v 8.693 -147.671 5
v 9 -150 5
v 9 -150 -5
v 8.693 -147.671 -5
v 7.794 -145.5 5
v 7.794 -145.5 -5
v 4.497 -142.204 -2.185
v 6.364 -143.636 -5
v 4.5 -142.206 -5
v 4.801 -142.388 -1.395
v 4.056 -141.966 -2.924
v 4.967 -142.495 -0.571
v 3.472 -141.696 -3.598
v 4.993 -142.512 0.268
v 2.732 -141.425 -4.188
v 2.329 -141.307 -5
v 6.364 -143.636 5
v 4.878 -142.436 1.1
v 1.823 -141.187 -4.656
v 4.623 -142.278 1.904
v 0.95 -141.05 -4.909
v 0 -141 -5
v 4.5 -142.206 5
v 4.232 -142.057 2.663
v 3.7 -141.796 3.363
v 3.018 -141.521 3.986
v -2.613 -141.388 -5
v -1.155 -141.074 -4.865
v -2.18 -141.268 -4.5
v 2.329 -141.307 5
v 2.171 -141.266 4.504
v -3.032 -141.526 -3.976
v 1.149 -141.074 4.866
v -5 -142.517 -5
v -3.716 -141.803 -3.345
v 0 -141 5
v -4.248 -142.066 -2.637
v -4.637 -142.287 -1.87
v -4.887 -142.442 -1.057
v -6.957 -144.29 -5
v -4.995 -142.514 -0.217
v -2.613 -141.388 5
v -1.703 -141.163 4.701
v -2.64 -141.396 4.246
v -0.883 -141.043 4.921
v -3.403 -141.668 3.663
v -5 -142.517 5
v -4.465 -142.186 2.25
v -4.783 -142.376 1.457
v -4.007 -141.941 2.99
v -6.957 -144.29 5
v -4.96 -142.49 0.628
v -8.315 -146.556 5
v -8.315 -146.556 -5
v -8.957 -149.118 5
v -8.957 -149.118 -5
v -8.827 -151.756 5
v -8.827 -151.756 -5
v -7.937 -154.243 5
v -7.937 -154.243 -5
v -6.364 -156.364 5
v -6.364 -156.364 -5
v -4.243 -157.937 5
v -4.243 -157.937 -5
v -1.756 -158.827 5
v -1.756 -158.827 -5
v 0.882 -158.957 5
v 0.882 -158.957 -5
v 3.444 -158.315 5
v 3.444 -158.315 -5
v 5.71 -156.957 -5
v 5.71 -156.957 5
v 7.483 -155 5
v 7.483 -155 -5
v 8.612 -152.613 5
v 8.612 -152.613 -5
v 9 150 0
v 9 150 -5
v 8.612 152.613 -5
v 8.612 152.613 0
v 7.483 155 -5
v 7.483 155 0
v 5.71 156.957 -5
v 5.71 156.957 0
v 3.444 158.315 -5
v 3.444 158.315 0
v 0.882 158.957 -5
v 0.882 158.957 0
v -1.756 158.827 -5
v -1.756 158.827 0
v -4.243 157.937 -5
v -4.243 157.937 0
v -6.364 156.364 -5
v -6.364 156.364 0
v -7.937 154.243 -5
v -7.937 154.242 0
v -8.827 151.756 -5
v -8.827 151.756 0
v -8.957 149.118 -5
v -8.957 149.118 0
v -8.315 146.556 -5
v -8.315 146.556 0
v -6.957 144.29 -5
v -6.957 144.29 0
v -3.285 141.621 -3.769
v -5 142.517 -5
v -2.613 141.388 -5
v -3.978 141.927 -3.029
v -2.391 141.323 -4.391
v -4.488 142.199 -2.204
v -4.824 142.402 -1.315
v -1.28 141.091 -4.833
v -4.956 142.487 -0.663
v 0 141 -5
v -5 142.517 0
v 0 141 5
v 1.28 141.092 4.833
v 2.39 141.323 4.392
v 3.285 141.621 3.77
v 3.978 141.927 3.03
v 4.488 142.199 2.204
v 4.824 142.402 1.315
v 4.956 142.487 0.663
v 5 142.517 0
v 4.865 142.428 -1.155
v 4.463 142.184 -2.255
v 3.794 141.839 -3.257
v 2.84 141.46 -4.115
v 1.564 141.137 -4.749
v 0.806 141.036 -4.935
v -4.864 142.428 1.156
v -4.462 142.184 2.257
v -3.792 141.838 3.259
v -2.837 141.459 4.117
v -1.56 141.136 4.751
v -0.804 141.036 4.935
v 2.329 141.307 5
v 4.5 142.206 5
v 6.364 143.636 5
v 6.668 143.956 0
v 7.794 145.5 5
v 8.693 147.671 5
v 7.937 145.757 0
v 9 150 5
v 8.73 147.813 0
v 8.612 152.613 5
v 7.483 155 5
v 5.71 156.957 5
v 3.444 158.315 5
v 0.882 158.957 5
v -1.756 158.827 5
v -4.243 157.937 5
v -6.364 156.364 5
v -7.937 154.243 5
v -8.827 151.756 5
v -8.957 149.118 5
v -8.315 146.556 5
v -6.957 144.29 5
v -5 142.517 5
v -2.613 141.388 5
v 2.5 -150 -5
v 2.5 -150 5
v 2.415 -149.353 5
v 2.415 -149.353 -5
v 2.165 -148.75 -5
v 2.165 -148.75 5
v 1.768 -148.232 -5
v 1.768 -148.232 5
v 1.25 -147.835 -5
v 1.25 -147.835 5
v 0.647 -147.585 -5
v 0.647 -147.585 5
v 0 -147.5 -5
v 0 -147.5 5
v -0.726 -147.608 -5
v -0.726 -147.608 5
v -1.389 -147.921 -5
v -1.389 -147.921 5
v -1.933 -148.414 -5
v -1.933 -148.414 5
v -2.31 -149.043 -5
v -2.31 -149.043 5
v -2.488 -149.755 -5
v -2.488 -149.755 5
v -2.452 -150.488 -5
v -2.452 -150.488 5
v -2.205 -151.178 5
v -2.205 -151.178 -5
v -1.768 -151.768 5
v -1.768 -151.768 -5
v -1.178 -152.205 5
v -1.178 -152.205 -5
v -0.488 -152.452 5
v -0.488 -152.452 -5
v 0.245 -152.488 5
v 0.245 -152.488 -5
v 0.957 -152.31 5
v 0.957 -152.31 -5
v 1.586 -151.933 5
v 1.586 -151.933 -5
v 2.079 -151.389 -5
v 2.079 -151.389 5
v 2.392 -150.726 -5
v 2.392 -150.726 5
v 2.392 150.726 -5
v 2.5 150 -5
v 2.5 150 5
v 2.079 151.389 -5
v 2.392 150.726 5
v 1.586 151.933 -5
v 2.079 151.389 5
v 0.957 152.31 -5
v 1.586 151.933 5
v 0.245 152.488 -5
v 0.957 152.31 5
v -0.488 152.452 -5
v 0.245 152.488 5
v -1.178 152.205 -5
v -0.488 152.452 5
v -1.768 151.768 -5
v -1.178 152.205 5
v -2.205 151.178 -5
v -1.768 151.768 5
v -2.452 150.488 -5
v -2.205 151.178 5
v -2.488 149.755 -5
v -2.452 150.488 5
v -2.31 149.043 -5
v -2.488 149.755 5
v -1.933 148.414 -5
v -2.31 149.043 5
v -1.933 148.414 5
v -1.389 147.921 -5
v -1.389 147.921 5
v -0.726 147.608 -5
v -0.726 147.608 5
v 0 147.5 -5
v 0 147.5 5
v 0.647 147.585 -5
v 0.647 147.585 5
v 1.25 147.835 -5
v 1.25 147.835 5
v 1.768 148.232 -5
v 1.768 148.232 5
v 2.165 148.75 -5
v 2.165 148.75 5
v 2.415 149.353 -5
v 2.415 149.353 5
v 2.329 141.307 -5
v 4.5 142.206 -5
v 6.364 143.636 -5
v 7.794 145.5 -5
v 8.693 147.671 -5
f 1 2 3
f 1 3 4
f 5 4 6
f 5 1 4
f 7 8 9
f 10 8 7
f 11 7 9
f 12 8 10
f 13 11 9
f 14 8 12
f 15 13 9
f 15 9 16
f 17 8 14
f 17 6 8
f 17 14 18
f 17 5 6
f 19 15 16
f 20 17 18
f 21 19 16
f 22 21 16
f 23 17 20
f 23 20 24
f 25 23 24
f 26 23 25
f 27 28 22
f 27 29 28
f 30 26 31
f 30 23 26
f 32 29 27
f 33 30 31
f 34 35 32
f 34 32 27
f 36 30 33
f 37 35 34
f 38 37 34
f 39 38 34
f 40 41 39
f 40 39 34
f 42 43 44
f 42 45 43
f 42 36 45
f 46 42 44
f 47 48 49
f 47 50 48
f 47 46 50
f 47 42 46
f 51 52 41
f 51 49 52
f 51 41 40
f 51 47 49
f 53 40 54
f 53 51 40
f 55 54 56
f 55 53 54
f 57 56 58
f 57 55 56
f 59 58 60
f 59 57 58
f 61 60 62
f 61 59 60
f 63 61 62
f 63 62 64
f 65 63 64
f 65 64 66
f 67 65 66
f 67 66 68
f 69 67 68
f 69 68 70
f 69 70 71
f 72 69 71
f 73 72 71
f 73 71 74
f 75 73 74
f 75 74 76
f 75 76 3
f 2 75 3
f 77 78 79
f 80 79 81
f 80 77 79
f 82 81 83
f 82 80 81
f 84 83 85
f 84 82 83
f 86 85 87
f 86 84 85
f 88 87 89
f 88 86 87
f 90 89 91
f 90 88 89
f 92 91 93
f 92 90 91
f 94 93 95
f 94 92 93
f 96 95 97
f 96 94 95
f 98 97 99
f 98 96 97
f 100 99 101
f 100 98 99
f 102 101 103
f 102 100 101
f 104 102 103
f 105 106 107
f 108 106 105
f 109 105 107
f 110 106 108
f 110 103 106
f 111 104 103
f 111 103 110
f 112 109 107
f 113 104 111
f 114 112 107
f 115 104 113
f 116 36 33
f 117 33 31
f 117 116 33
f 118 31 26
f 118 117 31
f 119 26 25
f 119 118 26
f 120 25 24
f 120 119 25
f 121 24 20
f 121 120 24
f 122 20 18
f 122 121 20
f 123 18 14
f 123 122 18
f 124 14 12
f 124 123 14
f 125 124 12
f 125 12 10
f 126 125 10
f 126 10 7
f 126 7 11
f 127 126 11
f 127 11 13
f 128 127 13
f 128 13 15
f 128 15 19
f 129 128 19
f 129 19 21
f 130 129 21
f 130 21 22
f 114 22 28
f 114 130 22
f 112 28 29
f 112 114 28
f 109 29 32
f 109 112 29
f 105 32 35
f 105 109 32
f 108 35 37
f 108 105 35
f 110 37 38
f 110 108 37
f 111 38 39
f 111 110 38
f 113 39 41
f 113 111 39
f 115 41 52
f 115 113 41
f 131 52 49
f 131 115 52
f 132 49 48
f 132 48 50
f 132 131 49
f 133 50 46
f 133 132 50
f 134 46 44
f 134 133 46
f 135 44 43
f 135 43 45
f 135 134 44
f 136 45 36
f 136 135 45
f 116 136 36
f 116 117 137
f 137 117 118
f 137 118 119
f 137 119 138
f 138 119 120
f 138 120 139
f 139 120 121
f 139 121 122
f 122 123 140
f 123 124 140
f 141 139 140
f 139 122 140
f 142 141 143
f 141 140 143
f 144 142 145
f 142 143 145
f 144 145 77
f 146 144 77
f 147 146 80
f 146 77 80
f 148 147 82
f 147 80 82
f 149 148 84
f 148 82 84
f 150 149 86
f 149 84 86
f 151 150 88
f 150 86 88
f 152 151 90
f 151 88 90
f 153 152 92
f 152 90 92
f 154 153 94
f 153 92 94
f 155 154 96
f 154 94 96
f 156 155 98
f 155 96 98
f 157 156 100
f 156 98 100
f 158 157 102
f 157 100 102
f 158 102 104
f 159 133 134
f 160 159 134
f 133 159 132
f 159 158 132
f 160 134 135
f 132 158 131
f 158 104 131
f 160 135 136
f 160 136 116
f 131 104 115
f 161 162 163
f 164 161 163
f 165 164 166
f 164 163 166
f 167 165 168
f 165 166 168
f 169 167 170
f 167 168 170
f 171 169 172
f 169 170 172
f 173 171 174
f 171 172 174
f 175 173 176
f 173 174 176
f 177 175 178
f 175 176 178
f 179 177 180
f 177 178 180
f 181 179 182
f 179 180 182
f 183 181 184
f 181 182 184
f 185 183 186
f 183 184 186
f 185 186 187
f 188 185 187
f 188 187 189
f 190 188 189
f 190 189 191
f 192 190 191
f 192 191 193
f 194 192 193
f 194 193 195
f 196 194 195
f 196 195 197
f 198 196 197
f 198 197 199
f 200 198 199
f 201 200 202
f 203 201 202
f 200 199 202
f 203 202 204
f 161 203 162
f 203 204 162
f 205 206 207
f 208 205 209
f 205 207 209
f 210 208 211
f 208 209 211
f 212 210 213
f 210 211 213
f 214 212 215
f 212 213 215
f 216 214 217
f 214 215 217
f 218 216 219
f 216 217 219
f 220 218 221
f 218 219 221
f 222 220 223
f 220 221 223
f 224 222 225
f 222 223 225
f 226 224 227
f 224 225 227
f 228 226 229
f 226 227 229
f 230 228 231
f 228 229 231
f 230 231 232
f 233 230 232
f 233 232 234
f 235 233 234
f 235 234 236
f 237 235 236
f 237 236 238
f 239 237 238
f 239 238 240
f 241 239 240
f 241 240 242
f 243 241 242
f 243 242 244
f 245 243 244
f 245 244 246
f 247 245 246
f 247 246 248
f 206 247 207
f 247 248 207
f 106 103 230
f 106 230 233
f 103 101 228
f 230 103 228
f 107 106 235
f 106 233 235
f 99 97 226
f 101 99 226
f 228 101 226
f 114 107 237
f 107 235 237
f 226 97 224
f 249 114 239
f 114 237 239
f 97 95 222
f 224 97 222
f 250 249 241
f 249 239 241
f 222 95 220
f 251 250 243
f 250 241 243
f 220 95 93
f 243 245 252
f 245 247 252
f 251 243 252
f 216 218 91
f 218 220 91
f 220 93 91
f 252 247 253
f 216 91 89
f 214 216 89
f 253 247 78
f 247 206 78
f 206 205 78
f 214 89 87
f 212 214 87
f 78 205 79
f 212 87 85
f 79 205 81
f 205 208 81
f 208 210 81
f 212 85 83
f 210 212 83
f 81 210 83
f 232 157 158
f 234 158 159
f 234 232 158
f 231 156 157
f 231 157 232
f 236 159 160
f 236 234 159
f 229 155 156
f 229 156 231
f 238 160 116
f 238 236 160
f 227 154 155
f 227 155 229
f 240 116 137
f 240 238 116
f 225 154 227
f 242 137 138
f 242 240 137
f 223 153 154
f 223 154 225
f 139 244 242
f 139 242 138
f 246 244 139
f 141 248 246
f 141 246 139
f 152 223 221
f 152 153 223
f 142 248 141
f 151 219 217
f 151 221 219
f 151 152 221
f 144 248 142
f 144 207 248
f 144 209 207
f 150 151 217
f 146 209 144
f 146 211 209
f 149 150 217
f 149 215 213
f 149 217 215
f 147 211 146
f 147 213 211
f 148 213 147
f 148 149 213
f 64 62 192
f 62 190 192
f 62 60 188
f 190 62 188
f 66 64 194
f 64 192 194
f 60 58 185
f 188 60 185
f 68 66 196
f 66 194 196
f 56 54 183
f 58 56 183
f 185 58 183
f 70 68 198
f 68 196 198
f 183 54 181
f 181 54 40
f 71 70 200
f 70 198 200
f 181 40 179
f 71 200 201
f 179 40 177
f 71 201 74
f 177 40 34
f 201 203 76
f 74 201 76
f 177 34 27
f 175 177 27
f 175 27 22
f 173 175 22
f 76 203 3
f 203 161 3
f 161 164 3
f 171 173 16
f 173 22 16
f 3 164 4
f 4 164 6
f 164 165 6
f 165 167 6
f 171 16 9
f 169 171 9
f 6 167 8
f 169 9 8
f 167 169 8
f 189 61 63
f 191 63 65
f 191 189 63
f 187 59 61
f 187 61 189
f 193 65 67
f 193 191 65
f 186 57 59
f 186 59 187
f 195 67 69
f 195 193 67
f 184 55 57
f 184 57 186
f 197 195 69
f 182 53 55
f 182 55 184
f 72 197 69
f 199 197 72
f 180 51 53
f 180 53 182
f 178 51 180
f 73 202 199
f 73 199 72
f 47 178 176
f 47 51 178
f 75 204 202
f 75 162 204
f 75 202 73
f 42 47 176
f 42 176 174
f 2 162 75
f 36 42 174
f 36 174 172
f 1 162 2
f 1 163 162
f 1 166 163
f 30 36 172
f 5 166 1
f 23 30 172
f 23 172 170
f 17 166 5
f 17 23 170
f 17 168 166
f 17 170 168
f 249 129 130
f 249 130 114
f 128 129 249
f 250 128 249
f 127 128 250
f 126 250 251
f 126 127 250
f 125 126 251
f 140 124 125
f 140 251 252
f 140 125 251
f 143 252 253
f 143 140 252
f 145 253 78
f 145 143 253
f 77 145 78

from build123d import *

# Parameters (mm, degrees)
SKETCH_1_R          = 5
EXTRUDE_1_DEPTH     = 150
SKETCH_2_R          = 9
EXTRUDE_2_DEPTH     = 5
CUT_EXTRUDE_1_REACH = 161.568
SKETCH_3_R          = 2.5


with BuildPart() as part:
    # 草图1 → 凸台-拉伸1 (new, symmetric)
    with BuildSketch(Plane(origin=(0, 0, 0), x_dir=(1, 0, 0), z_dir=(0, 1, 0))):
        with Locations(Location((0, 0, 0), (0, 0, 270))):
            Circle(SKETCH_1_R)
    extrude(amount=EXTRUDE_1_DEPTH, both=True)

    # 草图2 → 凸台-拉伸2 (add, symmetric)
    with BuildSketch(Plane.XY):
        with Locations((0, 150)):
            Circle(SKETCH_2_R)
        with Locations((0, -150)):
            Circle(SKETCH_2_R)
    extrude(amount=EXTRUDE_2_DEPTH, both=True)

    # 草图3 → 切除-拉伸1 (cut, up to next)
    with BuildSketch(Plane.XY.offset(5), mode=Mode.PRIVATE) as cut_extrude_1_sk1:
        with Locations((0, 150)):
            Circle(SKETCH_3_R)
    cut_extrude_1_tool1 = extrude(cut_extrude_1_sk1.sketch, amount=-CUT_EXTRUDE_1_REACH, mode=Mode.PRIVATE) & part.part
    # 草图3 → 切除-拉伸1 (cut, up to next)
    with BuildSketch(Plane.XY.offset(5), mode=Mode.PRIVATE) as cut_extrude_1_sk2:
        with Locations((0, -150)):
            Circle(SKETCH_3_R)
    cut_extrude_1_tool2 = extrude(cut_extrude_1_sk2.sketch, amount=-CUT_EXTRUDE_1_REACH, mode=Mode.PRIVATE) & part.part
    add(cut_extrude_1_tool1.solids().sort_by_distance((0, 150, 5))[0], mode=Mode.SUBTRACT)
    add(cut_extrude_1_tool2.solids().sort_by_distance((0, -150, 5))[0], mode=Mode.SUBTRACT)


solid = part.part
